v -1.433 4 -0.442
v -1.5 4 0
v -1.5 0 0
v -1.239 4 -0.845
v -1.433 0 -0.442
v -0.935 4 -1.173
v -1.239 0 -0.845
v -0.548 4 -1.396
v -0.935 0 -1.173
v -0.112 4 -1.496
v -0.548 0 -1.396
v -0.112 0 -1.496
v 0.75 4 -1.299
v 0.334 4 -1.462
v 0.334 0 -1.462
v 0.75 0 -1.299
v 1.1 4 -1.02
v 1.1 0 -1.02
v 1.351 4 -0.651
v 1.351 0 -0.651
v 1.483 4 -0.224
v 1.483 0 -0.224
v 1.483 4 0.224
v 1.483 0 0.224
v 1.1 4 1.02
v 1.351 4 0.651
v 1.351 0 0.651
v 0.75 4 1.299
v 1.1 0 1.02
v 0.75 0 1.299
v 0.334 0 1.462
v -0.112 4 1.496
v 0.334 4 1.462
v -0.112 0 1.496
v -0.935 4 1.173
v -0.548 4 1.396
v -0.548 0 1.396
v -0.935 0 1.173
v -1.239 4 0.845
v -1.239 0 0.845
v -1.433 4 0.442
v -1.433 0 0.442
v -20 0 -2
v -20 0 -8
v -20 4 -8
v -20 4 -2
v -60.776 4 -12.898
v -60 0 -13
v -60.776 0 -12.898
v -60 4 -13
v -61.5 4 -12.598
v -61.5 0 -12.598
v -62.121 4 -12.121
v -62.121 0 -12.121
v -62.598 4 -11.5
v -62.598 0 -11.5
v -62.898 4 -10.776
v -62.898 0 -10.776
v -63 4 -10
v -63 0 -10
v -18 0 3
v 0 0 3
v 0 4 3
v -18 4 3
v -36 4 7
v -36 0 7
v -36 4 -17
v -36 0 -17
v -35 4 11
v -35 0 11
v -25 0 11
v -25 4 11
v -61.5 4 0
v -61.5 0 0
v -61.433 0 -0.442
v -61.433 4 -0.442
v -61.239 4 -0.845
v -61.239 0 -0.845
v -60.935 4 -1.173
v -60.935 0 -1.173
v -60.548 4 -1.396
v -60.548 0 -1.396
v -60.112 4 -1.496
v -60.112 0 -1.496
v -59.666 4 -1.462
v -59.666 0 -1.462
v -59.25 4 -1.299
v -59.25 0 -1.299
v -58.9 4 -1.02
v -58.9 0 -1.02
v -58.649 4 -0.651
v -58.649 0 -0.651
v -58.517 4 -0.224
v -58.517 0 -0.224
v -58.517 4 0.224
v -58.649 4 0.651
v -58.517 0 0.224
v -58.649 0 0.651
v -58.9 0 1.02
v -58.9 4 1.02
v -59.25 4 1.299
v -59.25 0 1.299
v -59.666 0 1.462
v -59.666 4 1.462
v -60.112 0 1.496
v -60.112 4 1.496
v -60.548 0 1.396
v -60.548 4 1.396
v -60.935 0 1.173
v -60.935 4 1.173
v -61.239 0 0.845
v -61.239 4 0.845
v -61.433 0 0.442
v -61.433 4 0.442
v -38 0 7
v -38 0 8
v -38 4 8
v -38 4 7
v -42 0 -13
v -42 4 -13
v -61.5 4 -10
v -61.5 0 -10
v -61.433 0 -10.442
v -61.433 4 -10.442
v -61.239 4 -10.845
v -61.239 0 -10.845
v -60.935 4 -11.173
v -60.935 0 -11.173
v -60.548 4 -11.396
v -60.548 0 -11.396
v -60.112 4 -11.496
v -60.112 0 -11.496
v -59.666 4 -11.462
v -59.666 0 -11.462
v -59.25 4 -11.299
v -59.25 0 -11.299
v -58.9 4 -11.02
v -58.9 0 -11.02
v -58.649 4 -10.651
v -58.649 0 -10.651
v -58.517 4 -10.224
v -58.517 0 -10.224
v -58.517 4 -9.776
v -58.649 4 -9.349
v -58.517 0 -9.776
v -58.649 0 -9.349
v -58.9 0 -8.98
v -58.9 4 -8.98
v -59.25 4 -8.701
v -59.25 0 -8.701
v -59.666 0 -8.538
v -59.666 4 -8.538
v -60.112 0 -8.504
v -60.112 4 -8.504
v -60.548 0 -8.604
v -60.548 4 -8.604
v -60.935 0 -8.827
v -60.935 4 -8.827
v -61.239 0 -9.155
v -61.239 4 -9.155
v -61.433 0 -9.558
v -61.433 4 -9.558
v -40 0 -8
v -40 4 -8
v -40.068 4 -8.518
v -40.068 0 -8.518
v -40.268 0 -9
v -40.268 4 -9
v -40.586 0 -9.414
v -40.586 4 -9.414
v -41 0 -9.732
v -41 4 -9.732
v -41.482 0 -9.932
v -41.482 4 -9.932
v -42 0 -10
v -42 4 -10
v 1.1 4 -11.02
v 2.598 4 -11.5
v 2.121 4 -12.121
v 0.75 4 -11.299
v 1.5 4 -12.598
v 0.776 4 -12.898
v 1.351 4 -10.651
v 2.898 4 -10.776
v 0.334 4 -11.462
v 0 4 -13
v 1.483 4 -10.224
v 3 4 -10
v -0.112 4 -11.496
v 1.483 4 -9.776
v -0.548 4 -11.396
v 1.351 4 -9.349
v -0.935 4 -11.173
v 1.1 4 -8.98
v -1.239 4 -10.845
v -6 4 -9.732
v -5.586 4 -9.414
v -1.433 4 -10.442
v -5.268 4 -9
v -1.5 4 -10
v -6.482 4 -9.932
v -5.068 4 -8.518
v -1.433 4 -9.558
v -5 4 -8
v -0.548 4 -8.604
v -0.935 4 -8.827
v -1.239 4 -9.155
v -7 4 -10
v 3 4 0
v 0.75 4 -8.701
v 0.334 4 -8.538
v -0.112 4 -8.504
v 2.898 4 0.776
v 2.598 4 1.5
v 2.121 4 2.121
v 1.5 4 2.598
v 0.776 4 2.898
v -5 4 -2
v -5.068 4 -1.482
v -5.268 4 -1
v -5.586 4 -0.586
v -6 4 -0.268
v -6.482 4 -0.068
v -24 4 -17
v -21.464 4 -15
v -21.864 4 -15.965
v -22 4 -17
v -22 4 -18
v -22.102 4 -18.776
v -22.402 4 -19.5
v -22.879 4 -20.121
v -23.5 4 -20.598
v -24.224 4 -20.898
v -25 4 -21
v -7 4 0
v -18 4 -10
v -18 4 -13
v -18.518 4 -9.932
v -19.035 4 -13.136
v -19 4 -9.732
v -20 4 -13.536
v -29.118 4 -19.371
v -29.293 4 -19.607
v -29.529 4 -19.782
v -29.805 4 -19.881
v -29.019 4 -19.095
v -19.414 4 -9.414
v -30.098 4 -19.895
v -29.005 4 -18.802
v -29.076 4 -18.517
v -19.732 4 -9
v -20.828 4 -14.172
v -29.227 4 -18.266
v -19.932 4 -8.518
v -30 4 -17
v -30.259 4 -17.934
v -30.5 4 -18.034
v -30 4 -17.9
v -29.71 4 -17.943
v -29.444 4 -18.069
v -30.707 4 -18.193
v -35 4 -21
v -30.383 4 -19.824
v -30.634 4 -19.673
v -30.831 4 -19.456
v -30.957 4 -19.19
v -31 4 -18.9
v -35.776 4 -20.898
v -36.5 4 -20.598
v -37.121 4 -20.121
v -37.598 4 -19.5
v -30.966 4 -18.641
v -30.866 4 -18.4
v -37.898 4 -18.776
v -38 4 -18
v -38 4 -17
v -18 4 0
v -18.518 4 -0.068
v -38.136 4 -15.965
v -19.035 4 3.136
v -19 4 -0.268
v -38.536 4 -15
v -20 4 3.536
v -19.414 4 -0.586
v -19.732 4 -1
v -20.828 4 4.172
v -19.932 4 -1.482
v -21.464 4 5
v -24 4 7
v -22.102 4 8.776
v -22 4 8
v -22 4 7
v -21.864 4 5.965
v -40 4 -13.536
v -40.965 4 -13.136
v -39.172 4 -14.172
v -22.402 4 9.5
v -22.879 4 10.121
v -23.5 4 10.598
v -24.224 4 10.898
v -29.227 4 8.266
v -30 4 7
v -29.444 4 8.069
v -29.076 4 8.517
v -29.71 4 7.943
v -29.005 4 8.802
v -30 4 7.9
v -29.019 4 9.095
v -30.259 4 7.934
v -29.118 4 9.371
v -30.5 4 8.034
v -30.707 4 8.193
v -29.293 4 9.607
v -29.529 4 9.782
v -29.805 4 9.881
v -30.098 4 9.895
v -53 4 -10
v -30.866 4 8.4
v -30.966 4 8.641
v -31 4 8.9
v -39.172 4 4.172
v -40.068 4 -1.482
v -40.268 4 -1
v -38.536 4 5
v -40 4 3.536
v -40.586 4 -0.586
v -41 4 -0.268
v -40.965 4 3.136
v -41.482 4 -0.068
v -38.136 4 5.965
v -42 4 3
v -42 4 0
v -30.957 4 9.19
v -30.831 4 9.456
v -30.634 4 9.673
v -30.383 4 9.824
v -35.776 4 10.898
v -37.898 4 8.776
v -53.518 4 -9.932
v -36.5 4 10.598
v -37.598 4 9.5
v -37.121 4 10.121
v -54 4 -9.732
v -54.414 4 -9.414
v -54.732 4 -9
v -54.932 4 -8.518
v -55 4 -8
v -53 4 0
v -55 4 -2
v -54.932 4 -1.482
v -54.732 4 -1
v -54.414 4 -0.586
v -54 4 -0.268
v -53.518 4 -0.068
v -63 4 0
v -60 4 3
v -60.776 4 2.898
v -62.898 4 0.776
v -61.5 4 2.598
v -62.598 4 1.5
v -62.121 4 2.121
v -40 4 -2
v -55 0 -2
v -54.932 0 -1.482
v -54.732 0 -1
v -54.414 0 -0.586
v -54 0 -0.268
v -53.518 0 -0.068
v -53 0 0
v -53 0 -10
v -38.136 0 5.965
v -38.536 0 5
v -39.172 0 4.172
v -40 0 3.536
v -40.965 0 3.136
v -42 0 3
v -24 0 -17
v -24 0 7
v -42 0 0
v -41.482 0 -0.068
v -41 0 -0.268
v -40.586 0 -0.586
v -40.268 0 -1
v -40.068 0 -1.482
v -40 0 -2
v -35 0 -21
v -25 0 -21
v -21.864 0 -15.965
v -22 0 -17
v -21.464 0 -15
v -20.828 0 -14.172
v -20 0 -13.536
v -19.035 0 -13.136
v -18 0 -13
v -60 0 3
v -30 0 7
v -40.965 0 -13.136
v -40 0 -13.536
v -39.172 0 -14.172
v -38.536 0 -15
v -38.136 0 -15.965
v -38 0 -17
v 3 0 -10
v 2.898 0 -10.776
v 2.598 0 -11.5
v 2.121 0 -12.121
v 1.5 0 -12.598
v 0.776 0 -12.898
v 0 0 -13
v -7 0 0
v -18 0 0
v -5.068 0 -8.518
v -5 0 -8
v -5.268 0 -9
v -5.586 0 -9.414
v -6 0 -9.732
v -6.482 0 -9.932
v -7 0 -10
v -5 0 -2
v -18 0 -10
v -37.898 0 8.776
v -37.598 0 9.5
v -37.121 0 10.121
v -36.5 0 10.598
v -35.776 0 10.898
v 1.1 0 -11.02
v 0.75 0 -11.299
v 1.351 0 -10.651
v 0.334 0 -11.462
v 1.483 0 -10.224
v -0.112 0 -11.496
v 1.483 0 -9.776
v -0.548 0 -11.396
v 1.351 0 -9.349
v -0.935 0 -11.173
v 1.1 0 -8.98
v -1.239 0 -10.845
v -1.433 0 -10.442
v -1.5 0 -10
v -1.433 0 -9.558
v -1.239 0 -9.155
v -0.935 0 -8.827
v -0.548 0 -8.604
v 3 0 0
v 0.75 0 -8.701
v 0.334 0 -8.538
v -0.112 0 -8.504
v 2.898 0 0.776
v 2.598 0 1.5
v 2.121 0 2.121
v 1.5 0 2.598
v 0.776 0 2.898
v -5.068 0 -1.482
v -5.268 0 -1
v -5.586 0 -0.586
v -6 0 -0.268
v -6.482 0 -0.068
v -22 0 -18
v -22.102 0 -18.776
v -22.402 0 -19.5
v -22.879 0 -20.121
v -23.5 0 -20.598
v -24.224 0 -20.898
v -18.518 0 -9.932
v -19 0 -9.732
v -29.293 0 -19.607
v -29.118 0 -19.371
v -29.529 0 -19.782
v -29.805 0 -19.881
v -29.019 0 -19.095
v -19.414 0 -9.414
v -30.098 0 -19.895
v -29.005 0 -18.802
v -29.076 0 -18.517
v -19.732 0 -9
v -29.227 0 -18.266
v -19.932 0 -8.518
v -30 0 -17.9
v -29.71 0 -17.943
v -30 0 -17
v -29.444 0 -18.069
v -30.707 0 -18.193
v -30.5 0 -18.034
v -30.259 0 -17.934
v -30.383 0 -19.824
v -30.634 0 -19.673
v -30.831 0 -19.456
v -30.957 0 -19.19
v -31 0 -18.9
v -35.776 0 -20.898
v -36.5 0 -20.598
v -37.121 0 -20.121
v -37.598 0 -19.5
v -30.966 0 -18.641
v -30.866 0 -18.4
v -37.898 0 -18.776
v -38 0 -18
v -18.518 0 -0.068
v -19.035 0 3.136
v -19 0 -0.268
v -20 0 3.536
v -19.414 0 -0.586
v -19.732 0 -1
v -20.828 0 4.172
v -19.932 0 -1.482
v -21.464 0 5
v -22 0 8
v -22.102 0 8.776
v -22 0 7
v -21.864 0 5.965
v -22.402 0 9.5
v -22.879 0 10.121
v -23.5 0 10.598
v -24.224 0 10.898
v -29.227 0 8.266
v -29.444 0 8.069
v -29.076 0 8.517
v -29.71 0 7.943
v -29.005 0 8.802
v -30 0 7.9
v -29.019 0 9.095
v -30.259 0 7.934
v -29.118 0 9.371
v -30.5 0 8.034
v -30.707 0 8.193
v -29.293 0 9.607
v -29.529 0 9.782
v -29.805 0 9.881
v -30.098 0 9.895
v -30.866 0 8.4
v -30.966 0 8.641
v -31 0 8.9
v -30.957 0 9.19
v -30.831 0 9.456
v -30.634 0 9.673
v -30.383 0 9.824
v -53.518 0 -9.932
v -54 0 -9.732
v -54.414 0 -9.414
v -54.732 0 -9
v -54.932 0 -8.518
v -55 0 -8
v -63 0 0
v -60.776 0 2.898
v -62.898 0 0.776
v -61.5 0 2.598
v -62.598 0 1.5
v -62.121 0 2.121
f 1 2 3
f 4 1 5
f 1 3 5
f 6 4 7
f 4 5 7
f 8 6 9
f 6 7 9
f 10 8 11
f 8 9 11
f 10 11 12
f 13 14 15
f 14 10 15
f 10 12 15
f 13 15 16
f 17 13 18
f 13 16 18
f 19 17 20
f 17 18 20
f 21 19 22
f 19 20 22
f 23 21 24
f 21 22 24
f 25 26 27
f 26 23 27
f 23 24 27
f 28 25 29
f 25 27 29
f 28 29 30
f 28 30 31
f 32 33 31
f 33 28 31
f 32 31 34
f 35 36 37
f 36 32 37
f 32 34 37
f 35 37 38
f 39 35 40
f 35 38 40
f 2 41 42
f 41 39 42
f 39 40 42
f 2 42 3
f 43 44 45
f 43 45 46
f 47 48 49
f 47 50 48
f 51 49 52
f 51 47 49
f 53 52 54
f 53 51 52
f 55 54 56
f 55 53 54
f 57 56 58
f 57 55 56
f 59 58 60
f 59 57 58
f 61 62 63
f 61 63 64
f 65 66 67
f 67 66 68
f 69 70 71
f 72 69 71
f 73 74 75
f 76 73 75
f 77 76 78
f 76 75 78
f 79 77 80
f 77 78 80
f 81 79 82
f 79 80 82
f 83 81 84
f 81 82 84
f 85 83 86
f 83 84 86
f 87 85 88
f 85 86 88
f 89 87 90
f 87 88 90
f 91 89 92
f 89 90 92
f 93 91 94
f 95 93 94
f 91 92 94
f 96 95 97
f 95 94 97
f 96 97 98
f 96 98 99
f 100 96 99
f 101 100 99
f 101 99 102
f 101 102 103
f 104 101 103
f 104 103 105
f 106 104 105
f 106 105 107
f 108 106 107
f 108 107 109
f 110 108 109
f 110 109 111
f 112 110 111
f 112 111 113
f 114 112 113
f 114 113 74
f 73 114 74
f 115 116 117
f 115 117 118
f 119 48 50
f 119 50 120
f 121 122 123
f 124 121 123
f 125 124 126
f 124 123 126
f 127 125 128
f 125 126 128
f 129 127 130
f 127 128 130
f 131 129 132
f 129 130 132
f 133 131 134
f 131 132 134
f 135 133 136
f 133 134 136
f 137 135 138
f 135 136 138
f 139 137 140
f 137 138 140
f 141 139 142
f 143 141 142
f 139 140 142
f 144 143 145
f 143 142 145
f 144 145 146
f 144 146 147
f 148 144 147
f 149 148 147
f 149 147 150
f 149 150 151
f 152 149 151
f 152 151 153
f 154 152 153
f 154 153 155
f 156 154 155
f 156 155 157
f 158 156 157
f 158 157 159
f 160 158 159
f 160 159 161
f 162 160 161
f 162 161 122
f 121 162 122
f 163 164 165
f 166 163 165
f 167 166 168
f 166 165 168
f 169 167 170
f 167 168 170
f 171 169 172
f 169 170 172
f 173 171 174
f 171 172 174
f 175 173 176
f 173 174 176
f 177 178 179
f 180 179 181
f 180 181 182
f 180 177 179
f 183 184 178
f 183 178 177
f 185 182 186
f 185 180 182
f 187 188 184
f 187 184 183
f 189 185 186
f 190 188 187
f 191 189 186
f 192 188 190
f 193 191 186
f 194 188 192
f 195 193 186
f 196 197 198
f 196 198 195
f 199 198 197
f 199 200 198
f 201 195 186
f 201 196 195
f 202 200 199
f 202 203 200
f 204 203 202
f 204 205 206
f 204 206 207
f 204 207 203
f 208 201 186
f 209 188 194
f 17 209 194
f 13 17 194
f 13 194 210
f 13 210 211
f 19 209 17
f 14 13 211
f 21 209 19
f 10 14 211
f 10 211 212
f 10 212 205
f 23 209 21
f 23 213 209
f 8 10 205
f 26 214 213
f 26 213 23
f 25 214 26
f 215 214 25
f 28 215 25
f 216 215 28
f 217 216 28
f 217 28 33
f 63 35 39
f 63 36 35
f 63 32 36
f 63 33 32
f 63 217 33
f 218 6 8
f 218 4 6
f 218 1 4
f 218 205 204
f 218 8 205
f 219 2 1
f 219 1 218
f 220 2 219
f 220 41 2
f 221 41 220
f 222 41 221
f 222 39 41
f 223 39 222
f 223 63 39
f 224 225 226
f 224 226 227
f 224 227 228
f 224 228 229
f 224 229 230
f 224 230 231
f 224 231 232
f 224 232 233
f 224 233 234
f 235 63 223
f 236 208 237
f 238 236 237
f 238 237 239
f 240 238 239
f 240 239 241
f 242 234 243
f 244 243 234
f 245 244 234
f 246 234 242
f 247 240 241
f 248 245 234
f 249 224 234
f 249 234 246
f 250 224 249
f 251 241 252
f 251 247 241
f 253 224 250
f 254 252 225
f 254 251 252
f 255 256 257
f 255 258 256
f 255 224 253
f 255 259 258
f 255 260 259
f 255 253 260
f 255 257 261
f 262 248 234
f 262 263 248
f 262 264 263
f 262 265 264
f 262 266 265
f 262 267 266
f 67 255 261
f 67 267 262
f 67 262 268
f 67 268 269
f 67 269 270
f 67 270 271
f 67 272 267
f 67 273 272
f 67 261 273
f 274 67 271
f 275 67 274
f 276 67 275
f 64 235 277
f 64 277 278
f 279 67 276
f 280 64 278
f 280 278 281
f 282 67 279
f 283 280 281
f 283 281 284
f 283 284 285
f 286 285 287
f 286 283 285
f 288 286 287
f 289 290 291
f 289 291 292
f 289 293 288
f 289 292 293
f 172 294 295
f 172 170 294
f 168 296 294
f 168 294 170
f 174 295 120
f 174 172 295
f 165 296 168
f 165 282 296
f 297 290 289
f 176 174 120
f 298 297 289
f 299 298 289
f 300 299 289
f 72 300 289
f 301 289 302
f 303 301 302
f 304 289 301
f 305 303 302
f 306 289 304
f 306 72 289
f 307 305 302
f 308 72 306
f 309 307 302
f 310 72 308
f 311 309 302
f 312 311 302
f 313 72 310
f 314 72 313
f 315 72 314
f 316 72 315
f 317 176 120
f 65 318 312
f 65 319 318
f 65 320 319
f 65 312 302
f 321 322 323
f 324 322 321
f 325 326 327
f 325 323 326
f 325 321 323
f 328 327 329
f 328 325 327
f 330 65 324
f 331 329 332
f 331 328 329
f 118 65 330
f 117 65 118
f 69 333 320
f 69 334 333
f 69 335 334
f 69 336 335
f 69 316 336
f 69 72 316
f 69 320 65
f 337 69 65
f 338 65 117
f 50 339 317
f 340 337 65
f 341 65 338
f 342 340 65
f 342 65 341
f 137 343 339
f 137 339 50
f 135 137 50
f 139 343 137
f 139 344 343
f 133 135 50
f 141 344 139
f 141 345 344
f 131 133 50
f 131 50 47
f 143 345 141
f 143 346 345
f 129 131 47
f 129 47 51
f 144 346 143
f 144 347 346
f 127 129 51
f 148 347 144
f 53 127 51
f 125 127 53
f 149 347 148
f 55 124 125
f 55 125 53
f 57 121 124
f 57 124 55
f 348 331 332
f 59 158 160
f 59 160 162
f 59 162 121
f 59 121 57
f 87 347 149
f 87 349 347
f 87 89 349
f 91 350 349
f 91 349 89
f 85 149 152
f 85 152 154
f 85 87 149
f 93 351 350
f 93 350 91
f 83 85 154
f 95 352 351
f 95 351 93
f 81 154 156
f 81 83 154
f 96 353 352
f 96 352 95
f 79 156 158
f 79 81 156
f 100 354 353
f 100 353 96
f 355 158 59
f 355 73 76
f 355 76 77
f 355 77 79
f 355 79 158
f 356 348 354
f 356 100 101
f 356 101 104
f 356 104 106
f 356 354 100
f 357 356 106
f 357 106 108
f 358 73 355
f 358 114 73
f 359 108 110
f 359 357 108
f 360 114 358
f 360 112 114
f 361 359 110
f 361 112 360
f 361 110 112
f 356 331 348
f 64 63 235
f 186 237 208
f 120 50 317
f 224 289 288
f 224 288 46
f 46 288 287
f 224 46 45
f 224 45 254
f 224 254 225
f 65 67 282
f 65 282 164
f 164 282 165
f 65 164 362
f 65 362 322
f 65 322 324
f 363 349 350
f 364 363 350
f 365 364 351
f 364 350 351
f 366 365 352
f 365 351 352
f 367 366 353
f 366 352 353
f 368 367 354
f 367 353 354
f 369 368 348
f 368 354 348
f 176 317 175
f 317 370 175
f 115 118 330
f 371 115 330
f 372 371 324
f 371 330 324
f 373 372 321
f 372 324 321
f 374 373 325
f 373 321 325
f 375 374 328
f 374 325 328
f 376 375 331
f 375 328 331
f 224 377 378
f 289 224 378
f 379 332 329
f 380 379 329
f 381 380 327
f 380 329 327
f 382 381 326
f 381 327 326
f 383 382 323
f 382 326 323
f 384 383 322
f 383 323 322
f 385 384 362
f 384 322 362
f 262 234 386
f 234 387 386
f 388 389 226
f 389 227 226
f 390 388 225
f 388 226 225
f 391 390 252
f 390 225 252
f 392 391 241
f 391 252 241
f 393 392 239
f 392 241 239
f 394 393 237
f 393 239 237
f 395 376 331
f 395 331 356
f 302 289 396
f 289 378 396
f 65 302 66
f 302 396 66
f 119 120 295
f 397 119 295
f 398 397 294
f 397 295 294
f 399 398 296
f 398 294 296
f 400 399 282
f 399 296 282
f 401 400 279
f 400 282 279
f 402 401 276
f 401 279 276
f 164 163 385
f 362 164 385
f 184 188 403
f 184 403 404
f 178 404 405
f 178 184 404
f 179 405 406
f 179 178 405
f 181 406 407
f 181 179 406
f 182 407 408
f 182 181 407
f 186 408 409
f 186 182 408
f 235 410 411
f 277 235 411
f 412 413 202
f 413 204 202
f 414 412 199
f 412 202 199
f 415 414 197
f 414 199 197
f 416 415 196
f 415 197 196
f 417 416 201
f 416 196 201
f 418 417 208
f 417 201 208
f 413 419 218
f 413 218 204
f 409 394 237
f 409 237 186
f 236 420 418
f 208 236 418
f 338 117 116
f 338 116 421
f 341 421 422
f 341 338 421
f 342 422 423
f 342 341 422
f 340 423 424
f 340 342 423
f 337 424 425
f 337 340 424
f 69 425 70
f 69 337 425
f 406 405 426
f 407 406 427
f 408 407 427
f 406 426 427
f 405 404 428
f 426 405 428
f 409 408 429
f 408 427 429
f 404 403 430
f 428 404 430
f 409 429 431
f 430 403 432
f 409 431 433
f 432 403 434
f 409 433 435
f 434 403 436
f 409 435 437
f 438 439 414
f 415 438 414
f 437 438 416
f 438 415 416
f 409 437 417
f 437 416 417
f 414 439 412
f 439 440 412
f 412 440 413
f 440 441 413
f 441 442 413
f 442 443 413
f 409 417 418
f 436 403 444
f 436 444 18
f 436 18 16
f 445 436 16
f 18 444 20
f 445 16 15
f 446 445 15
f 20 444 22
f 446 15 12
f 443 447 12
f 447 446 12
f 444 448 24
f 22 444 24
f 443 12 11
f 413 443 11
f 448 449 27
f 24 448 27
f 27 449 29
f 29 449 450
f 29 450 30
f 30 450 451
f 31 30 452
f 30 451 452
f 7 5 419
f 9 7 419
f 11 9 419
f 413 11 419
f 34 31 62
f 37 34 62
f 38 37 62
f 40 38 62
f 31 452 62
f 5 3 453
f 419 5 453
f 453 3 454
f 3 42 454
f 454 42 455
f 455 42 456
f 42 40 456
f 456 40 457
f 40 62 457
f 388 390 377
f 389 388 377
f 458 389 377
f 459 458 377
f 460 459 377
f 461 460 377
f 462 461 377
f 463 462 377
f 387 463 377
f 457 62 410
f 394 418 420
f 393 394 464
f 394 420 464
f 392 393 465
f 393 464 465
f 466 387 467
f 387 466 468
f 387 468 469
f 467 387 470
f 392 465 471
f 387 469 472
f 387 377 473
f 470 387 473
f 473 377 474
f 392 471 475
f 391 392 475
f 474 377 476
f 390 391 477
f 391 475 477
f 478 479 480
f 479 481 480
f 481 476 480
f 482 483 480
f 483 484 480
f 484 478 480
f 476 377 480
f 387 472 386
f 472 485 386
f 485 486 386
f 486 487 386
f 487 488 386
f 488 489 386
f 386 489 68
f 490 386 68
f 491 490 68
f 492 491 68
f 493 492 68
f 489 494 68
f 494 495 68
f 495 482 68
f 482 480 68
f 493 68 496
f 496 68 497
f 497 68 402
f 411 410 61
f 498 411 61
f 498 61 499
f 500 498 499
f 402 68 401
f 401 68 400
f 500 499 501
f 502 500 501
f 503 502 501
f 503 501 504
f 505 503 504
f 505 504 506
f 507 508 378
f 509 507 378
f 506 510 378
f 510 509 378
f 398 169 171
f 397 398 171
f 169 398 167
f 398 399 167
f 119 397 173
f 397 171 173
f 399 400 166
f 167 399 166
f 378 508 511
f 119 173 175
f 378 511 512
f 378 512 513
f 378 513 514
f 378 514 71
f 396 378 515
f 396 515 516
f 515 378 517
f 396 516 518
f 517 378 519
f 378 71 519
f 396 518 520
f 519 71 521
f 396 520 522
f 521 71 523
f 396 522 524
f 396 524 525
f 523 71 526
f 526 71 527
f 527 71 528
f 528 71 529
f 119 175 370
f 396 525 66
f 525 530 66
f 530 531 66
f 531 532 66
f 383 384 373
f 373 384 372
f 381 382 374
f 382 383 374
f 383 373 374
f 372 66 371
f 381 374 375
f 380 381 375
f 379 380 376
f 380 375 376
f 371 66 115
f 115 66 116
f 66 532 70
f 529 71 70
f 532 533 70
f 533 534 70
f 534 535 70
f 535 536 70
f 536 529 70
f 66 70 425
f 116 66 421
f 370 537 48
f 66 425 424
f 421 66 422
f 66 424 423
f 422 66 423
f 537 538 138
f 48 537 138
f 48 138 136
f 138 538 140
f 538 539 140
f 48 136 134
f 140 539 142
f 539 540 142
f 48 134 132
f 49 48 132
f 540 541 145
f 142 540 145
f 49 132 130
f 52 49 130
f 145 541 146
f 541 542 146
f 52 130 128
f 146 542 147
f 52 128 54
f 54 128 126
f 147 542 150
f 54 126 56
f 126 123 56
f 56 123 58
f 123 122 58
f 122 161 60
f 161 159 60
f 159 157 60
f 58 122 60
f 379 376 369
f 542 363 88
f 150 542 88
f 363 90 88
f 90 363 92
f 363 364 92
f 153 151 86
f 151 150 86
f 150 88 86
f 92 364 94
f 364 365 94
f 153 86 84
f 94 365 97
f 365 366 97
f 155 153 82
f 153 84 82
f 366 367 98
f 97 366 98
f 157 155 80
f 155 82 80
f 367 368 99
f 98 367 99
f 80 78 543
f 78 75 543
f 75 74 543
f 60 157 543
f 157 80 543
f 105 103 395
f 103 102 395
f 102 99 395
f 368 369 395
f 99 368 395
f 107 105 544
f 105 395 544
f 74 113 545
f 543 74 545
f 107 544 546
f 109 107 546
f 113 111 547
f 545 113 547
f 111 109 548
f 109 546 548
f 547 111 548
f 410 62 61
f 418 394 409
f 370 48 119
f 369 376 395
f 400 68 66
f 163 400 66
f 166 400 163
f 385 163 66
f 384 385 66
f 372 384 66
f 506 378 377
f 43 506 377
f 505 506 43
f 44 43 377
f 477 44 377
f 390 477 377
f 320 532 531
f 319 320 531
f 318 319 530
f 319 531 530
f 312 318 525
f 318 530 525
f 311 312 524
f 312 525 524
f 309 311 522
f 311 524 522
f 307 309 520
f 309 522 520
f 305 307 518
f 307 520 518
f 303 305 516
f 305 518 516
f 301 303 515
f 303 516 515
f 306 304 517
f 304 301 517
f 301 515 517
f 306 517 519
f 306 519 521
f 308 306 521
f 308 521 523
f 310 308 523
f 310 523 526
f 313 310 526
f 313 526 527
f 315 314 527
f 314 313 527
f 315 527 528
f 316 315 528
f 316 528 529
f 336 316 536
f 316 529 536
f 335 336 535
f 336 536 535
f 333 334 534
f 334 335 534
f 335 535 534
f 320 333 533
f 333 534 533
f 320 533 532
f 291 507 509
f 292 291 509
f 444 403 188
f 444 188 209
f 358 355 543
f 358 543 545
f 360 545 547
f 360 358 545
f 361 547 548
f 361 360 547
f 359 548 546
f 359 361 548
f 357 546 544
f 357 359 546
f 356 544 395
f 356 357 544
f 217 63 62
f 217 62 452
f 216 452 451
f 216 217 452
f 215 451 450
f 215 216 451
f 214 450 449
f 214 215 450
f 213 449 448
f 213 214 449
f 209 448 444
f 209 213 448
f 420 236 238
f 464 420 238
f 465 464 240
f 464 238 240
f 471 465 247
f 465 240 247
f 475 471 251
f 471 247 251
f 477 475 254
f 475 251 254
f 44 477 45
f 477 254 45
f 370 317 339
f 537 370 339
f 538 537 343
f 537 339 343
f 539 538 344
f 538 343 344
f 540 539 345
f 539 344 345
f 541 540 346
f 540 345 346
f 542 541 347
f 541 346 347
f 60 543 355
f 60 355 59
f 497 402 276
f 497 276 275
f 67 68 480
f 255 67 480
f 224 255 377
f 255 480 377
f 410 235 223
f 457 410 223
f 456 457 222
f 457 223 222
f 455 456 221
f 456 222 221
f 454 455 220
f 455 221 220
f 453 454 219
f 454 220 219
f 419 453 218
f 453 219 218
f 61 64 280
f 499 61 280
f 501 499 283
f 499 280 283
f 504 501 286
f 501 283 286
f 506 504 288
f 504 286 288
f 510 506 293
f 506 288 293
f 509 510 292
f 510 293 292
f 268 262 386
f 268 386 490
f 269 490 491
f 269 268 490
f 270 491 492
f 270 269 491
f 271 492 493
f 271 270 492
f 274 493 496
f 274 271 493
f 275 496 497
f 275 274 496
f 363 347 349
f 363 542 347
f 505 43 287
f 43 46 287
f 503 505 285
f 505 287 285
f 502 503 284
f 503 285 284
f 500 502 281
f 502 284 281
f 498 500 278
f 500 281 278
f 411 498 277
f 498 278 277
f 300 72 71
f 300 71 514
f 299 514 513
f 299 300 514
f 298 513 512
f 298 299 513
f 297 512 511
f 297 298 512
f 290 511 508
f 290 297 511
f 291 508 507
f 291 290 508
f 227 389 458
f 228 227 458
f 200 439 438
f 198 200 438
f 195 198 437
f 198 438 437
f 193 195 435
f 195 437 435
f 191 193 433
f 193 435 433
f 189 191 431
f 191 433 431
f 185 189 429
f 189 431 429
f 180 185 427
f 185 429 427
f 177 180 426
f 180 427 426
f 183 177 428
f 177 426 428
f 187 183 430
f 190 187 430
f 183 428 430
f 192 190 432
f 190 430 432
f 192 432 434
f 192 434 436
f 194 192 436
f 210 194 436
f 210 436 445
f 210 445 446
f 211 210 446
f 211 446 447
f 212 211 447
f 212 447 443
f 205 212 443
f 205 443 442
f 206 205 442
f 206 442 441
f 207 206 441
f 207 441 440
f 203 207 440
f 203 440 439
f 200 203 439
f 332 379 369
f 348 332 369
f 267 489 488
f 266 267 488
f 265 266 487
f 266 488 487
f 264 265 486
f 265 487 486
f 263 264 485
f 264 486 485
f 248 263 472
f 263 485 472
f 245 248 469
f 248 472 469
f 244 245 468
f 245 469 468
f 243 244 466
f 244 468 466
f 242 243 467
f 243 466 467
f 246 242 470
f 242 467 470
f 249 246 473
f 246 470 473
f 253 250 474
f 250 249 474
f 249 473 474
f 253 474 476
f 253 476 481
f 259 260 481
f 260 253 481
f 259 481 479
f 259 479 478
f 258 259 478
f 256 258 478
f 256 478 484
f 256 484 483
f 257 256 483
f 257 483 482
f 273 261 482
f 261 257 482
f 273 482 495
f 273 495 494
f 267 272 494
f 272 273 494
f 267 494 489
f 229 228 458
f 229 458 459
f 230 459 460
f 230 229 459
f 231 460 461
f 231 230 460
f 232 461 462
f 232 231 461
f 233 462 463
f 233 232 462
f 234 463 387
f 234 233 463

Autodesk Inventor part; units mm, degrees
ref_plane "YZ Plane" through (0, 0, 0) normal (1, 0, 0) x (0, 1, 0)
ref_plane "XZ Plane" through (0, 0, 0) normal (0, 1, 0) x (-1, 0, 0)
ref_plane "XY Plane" through (0, 0, 0) normal (0, 0, 1) x (1, 0, 0)
sketch "Sketch1" plane through (0, 0, 0) normal (0, 1, 0) x (-1, 0, 0)
  line L0 (0, 0) -> (60, 0)
  line L1 (60, 0) -> (60, -10)
  line L2 (60, -10) -> (0, -10)
  line L3 (0, -10) -> (0, 0)
  circle A0 centre (60, 0) radius 1.5
  circle A1 centre (60, -10) radius 1.5
  circle A2 centre (0, 0) radius 1.5
  circle A3 centre (0, -10) radius 1.5
  line L4 (60, -10) -> (63, -10)
  line L5 (63, -10) -> (63, -13)
  line L6 (63, -13) -> (60, -13)
  line L7 (60, -13) -> (60, -10)
  line L8 (0, 0) -> (-3, 0)
  line L9 (-3, 0) -> (-3, 3)
  line L10 (-3, 3) -> (0, 3)
  line L11 (0, 3) -> (0, 0)
  line L12 (-3, 3) -> (63, 3)
  line L13 (63, 3) -> (63, -13)
  line L14 (63, -13) -> (-3, -13)
  line L15 (-3, -13) -> (-3, 3)
  line L16 (60, -5) -> (0, -5)
  line L17 (24, 7) -> (36, 7)
  line L18 (36, 7) -> (36, -17)
  line L19 (36, -17) -> (24, -17)
  line L20 (24, -17) -> (24, 7)
  line L21 (24, 7) -> (36, -17) construction
  line L22 (36, 7) -> (24, -17) construction
  line L23 (30, -5) -> (30, 6.25)
  line L24 (30, 6.25) -> (30, 8.9)
  circle A4 centre (30, 8.9) radius 1
  line L25 (30, -5) -> (30, -16.25)
  line L26 (30, -16.25) -> (30, -18.9)
  circle A5 centre (30, -18.9) radius 1
  line L27 (36, 7) -> (24, 7)
  line L28 (24, 7) -> (24, 11)
  line L29 (24, 11) -> (36, 11)
  line L30 (36, 11) -> (36, 7)
  line L31 (36, -17) -> (24, -17)
  line L32 (24, -17) -> (24, -21)
  line L33 (24, -21) -> (36, -21)
  line L34 (36, -21) -> (36, -17)
  line L35 (36, 11) -> (38, 11)
  line L36 (38, 11) -> (38, -21)
  line L37 (38, -21) -> (36, -21)
  line L38 (36, -21) -> (36, 11)
  line L39 (24, 11) -> (20.9428, 11)
  line L40 (24, 9) -> (24, 11)
  line L41 (24, 11) -> (22, 11)
  line L42 (22, 11) -> (22, -21)
  line L43 (22, -21) -> (24, -21)
  line L44 (24, -21) -> (24, 11)
  line L45 (60, -5) -> (55, -5)
  line L46 (55, -5) -> (40, -5)
  line L47 (40, -5) -> (40, 0)
  line L48 (40, 0) -> (55, 0)
  line L49 (55, 0) -> (55, -5)
  line L50 (55, 0) -> (40, 0)
  line L51 (40, 0) -> (40, -10)
  line L52 (40, -10) -> (55, -10)
  line L53 (55, -10) -> (55, 0)
  line L54 (0, -5) -> (5, -5)
  line L55 (5, -5) -> (20, -5)
  line L56 (20, -5) -> (20, 0)
  line L57 (20, 0) -> (5, 0)
  line L58 (5, 0) -> (5, -5)
  line L59 (20, 0) -> (5, 0)
  line L60 (5, 0) -> (5, -10)
  line L61 (5, -10) -> (20, -10)
  line L62 (20, -10) -> (20, 0)
  point P0 (24, -13)
  point P1 (24, 3)
  point P2 (38, 3)
  point P3 (38, -13)
  point P4 (22, -13)
  point P5 (22, 3)
  dimension "d0" = 60
  dimension "d1" = 10
  dimension "d2" = 3
  dimension "d3" = 3
  dimension "d4" = 3
  dimension "d5" = 3
  dimension "d6" = 3
  dimension "d7" = 3
  dimension "d8" = 3
  dimension "d9" = 3
  dimension "d12" = 12
  dimension "d13" = 24
  dimension "d14" = 11.25
  dimension "d15" = 2.65
  dimension "d16" = 2
  dimension "d17" = 11.25
  dimension "d18" = 2.65
  dimension "d19" = 2
  dimension "d20" = 4
  dimension "d21" = 4
  dimension "d22" = 2
  dimension "d24" = 2
  dimension "d28" = 5
  dimension "d29" = 15
  dimension "d30" = 5
  dimension "d31" = 5
  dimension "d32" = 15
extrude "Extrusion1" add sketch "Sketch1" along normal blind 4 contours A2 L11 L12 L42 L0 | L0 L58 L16 L3 A2 | L3 A3 L2 L42 L14 L15 L8 A2 | L8 L9 L10 L11 A2 | L16 L60 L2 A3 L3 | L0 L42 L16 L56 | L42 L39 L28 L20 L12 | L12 L20 L0 L42 | L0 L20 L16 L42 | L16 L42 L2 L62 | L42 L2 L20 L14 | L14 L20 L32 L43 L42 | L16 L20 L2 L42 | L28 L29 L30 L17 | L19 L34 L33 L32 | L18 L30 L35 L36 L12 | L12 L36 L0 L18 | L0 L36 L16 L18 | L18 L2 L36 L14 | L14 L36 L37 L34 L18 | L12 L13 L4 A1 L1 A0 L0 L36 | L0 L47 L16 L36 | L16 L36 L2 L18 | L36 L2 A1 L7 L14 | L16 L51 L2 L36 | L7 A1 L4 L5 L6 | L0 A0 L1 L16 L49 | L16 L1 A1 L2 L53
fillet "Fillet1" radius 4 4 edges at (-22, 2, 3) (-22, 2, -13) (-38, 2, -13) (-38, 2, 3)
fillet "Fillet2" radius 3 4 edges at (-38, 2, 11) (-22, 2, 11) (-22, 2, -21) (-38, 2, -21)
fillet "Fillet3" radius 3 4 edges at (-63, 2, 3) (-63, 2, -13) (3, 2, -13) (3, 2, 3)
fillet "Fillet4" radius 2 8 edges at (-55, 2, -10) (-40, 2, -10) (-40, 2, 0) (-55, 2, 0) (-20, 2, -10) (-20, 2, 0) (-5, 2, 0) (-5, 2, -10)
properties part number "microservo_support1"
